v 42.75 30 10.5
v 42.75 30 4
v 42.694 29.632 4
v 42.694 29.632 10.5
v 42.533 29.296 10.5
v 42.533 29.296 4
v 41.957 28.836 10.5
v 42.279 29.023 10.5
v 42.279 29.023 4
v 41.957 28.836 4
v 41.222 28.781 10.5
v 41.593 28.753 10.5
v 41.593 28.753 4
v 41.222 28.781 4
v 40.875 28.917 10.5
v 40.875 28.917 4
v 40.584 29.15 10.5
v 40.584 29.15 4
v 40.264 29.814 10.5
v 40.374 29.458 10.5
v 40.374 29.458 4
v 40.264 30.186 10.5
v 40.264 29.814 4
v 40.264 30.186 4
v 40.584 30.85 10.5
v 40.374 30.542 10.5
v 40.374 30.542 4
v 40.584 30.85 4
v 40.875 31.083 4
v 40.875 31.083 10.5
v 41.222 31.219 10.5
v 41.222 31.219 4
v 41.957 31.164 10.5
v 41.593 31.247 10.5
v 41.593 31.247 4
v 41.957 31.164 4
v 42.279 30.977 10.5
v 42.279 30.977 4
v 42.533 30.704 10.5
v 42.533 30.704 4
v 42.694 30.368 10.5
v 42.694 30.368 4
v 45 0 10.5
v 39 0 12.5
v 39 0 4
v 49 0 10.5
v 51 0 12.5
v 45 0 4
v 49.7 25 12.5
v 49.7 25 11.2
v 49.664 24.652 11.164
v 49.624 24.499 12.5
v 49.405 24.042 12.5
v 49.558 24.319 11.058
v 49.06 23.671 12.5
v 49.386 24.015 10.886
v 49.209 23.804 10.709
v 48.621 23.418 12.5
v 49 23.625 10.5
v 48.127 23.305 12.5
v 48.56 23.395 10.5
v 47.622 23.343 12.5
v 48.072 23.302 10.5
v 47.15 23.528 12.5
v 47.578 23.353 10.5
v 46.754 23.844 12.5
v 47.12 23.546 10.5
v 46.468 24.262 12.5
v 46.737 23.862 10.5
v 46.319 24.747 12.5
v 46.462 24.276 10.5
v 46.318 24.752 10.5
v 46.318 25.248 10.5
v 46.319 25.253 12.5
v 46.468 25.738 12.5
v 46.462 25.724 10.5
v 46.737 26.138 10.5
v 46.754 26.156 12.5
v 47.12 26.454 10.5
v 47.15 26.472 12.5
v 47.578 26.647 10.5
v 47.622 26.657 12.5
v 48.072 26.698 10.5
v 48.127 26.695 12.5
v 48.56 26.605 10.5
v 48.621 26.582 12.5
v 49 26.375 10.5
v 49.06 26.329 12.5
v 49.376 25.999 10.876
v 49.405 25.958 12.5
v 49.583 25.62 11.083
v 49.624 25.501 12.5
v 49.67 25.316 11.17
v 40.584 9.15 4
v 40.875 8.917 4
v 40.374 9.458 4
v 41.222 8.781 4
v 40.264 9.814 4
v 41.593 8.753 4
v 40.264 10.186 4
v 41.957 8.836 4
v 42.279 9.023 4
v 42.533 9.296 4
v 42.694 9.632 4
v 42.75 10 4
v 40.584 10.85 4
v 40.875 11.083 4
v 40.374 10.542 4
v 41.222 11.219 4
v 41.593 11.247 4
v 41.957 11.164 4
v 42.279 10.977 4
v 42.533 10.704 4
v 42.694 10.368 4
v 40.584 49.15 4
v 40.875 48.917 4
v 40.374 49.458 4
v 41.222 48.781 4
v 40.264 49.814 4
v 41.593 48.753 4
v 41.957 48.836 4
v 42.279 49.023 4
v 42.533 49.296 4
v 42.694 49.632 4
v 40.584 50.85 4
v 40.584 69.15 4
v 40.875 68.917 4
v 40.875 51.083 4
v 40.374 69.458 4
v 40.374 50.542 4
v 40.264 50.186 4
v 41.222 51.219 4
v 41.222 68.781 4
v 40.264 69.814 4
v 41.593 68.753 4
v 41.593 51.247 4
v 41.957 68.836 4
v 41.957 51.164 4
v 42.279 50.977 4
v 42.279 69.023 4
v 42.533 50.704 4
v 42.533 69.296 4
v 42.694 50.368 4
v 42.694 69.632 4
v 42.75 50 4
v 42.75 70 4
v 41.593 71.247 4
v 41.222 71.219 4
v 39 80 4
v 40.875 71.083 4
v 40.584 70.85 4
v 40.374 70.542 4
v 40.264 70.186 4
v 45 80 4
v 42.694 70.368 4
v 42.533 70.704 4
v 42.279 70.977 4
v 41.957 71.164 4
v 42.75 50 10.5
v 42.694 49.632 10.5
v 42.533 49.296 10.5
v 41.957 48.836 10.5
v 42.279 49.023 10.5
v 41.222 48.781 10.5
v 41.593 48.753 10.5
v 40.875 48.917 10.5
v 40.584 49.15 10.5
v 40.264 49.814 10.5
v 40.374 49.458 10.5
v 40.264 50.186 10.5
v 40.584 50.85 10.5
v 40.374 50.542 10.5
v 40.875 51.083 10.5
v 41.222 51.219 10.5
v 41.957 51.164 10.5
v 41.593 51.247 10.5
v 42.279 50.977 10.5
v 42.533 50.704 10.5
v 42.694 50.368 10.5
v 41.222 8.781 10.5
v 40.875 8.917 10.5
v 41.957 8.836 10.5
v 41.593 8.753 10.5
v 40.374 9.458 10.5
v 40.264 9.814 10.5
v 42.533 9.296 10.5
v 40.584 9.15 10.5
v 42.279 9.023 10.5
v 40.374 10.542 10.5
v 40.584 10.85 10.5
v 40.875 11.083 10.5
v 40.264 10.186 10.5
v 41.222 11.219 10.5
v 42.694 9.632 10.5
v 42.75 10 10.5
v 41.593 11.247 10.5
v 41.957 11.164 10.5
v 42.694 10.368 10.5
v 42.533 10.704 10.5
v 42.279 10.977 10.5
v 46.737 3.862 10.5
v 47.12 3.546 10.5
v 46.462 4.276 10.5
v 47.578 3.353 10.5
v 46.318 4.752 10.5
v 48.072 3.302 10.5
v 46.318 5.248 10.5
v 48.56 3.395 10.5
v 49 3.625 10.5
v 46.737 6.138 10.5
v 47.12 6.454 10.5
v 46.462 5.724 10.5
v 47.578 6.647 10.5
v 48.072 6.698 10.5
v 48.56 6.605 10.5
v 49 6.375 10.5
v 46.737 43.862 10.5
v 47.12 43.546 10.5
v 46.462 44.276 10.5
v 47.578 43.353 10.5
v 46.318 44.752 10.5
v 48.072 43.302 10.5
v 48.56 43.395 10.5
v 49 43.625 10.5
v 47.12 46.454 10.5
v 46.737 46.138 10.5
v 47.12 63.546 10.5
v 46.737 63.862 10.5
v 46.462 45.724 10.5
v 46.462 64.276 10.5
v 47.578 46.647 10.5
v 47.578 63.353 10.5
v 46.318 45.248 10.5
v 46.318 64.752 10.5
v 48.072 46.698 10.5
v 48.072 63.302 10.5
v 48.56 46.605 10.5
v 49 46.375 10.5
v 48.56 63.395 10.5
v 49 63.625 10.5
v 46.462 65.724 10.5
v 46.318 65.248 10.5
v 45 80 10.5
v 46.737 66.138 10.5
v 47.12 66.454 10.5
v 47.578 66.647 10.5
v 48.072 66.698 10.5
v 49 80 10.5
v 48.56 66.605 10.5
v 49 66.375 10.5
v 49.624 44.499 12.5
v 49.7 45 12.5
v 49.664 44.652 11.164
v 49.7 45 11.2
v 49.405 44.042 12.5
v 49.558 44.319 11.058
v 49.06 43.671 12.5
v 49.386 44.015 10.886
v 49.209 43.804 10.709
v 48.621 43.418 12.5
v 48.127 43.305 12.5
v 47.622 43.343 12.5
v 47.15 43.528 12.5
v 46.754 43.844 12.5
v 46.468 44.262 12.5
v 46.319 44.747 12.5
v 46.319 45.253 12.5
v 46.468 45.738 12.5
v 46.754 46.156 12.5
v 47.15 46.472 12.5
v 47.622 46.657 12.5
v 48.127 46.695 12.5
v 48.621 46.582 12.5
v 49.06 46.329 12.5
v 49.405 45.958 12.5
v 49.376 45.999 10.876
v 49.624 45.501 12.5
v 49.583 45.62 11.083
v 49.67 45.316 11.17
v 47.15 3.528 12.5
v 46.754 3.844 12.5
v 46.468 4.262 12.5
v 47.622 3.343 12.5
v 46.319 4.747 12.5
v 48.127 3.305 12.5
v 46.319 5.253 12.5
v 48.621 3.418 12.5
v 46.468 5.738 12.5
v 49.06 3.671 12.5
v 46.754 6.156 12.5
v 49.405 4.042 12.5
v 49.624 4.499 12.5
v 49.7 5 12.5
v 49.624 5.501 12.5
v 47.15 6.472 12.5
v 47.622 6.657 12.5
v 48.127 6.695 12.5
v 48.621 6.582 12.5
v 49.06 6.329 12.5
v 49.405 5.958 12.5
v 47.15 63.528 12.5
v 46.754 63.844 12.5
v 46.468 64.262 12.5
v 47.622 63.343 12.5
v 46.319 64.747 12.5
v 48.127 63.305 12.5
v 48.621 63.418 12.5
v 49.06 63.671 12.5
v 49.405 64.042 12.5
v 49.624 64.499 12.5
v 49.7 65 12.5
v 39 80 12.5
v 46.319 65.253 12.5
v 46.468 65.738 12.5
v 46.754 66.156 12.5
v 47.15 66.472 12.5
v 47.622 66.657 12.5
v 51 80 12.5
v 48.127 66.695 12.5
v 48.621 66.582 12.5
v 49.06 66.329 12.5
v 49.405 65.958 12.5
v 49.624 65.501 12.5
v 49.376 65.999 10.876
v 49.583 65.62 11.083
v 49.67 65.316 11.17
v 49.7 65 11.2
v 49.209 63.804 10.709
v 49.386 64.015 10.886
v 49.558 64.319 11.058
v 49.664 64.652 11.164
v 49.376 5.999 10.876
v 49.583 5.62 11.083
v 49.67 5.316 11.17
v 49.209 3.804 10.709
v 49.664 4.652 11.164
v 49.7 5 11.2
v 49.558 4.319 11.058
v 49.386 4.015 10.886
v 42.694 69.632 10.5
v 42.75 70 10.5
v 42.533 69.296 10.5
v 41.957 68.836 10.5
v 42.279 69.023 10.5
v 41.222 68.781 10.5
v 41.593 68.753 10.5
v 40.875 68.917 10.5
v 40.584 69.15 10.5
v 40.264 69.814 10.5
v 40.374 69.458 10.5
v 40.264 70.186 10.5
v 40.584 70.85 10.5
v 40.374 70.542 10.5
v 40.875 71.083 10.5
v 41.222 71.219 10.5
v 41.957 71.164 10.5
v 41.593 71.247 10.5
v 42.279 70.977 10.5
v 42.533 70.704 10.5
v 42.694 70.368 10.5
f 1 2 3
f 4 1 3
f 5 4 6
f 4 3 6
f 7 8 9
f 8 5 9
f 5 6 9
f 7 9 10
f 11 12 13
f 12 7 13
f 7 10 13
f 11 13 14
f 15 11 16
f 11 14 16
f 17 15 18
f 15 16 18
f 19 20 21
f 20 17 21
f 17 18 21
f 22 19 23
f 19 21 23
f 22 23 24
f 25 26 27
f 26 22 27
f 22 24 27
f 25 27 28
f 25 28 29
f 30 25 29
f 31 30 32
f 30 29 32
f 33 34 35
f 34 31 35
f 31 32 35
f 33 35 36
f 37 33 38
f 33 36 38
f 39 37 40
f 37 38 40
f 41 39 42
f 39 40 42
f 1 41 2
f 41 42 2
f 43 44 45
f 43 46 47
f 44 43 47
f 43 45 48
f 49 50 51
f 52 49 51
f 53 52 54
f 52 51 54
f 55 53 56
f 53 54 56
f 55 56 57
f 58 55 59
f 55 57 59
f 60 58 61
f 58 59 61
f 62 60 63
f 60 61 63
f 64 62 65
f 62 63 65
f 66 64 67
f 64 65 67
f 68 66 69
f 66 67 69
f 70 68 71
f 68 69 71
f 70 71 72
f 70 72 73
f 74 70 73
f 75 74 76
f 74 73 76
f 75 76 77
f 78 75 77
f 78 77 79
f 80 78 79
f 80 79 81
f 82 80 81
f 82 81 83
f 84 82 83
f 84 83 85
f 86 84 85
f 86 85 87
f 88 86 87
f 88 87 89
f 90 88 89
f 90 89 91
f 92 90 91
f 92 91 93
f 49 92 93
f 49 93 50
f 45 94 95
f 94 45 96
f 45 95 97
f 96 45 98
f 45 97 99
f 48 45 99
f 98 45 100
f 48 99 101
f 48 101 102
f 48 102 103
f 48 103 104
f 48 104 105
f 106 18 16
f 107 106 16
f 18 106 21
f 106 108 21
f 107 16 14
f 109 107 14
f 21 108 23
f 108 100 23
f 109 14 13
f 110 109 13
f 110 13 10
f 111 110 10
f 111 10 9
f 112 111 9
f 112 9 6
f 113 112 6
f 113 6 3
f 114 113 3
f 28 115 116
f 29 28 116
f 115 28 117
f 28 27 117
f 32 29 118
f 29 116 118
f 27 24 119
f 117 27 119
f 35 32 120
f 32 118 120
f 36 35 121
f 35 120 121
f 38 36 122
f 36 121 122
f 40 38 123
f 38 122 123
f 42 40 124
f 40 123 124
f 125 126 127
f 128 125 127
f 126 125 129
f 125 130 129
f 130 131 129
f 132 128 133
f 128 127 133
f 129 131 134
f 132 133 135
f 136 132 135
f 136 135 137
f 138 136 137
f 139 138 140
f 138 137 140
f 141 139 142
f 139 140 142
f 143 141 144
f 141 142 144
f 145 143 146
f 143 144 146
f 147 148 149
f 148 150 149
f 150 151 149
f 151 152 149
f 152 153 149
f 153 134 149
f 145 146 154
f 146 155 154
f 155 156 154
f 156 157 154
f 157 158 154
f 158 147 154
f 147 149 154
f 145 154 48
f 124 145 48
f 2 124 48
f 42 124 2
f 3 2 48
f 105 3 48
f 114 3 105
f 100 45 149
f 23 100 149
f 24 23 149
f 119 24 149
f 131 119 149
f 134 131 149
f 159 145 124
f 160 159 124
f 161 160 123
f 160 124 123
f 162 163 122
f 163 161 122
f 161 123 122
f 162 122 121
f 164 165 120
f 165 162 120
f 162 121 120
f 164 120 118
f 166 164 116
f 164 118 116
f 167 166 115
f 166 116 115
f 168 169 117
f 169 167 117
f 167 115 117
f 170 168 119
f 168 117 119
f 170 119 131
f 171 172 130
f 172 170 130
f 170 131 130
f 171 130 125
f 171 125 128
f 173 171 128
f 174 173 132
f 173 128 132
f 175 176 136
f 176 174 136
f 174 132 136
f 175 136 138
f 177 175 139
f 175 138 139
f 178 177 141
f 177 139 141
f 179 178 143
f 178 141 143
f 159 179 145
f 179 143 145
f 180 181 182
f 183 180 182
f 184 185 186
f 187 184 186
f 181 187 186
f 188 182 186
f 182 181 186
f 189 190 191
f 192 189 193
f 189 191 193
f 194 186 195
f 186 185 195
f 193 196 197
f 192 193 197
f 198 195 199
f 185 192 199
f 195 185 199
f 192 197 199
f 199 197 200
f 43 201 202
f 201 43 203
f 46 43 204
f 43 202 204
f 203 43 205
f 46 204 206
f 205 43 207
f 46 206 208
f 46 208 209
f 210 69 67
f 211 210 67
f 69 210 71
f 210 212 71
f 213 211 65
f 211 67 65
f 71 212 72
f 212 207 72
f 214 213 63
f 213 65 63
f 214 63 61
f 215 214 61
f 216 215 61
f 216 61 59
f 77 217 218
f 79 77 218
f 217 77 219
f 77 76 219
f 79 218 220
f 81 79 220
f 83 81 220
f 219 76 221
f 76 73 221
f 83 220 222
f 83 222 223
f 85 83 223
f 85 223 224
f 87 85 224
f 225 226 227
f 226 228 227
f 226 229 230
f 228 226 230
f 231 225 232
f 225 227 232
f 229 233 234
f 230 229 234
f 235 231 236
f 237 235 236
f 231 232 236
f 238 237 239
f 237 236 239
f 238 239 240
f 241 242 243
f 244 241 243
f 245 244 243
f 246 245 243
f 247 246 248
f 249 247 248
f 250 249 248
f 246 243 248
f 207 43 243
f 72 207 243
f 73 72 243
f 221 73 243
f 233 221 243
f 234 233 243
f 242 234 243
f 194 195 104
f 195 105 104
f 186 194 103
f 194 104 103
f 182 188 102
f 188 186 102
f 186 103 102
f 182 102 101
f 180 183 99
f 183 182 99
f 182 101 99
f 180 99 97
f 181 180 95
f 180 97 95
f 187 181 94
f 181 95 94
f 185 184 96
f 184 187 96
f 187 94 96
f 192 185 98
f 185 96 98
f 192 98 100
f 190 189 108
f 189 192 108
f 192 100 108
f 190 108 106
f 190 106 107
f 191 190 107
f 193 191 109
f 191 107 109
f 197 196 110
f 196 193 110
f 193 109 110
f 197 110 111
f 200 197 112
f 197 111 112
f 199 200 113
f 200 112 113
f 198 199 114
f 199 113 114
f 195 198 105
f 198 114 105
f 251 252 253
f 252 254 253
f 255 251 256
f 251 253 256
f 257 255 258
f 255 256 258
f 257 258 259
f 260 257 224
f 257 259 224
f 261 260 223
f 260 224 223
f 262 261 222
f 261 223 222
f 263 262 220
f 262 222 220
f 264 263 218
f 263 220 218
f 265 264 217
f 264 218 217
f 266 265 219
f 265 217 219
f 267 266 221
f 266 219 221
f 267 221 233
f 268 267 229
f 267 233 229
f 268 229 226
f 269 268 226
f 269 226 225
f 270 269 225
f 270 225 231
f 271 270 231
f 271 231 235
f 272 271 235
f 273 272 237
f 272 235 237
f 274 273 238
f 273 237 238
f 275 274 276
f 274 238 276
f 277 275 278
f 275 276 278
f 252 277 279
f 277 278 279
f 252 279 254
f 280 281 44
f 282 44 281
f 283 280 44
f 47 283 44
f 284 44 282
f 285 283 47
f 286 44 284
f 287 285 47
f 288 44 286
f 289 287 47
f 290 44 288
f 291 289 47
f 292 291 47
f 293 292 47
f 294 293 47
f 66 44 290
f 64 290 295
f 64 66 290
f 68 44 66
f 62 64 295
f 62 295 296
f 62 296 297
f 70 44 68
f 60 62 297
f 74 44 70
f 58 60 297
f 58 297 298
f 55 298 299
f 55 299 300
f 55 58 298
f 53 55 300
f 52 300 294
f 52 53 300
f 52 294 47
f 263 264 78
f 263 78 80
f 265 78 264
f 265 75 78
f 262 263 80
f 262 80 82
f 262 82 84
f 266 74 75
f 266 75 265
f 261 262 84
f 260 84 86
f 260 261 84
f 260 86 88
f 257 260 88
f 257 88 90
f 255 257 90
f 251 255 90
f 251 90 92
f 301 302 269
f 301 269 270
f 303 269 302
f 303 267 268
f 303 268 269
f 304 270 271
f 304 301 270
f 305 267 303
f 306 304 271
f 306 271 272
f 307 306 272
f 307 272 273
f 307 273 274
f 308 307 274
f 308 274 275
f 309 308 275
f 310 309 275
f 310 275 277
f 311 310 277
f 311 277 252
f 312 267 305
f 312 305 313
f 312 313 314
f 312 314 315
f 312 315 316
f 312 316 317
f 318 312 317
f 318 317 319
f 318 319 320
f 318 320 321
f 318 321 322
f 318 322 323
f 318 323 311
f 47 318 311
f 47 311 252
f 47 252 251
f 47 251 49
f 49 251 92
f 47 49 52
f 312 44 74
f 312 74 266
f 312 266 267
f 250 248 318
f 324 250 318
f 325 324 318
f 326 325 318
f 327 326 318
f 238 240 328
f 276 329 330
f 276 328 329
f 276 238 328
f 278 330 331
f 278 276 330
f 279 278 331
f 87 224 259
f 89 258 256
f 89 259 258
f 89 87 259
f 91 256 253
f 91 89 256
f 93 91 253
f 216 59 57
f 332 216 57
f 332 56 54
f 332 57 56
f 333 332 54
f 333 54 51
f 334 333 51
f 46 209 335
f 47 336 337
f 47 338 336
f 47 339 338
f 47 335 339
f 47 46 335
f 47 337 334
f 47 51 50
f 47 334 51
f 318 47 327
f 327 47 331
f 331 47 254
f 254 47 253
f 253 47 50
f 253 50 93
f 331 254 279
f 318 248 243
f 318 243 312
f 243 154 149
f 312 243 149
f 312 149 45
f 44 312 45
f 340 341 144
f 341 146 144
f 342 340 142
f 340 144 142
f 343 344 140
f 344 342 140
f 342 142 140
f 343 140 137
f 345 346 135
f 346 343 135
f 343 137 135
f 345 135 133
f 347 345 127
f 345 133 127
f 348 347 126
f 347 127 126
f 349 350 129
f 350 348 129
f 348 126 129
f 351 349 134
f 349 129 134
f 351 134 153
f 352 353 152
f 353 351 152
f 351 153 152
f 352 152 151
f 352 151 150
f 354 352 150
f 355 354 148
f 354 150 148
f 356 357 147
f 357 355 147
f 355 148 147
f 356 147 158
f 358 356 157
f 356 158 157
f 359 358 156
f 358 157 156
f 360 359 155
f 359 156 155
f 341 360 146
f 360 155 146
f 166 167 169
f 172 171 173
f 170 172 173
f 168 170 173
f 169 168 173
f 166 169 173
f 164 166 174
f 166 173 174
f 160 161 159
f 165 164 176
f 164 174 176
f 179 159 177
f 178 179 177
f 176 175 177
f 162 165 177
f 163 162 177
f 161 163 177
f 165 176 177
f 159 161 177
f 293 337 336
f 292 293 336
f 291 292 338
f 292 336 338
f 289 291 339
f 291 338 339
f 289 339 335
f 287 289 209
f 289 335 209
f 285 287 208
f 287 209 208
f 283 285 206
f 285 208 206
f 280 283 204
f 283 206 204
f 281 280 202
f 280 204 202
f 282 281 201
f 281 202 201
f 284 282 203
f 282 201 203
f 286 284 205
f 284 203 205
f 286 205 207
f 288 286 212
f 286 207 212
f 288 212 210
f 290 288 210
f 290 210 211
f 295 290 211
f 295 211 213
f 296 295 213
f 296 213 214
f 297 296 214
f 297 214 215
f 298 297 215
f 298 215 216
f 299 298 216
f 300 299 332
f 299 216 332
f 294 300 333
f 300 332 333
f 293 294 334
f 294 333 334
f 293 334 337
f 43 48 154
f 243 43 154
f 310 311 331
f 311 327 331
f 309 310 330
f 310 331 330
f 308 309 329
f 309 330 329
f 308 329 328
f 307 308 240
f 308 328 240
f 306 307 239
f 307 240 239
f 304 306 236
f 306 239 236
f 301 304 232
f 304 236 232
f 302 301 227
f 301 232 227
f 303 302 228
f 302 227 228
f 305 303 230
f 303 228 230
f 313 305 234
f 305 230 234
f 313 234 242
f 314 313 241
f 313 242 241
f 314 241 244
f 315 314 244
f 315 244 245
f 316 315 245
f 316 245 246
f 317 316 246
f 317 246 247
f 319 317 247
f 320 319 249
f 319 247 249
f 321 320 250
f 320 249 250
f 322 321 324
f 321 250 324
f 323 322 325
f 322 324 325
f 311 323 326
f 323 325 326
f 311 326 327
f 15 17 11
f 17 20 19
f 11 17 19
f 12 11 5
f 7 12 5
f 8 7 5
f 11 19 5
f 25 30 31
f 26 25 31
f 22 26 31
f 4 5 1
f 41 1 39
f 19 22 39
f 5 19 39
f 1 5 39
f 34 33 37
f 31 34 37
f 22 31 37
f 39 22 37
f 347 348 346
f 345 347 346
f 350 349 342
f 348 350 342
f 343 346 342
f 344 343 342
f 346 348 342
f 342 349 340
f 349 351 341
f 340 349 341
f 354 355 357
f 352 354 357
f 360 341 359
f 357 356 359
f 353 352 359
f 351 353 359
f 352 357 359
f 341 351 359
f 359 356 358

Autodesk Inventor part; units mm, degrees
ref_plane "Right_Connecting_Web_StartPlane" through (0, 0, 4) normal (0, 0, 1) x (1, 0, 0)
sketch "Right_Connecting_Web_Profile" plane through (0, 0, 4) normal (0, 0, 1) x (1, 0, 0)
  line L0 (39, 0) -> (45, 0)
  line L1 (45, 0) -> (45, 80)
  line L2 (45, 80) -> (39, 80)
  line L3 (39, 80) -> (39, 0)
  point P0 (0, 0)
  dimension "d1" = 39
  dimension "d2" = 6
  dimension "d3" = 80
extrude "Right_Connecting_Web" add sketch "Right_Connecting_Web_Profile" along normal blind 8.5
ref_plane "Right_Rod_Contact_Flange_StartPlane" through (0, 0, 10.5) normal (0, 0, 1) x (1, 0, 0)
sketch "Right_Rod_Contact_Flange_Profile" plane through (0, 0, 10.5) normal (0, 0, 1) x (1, 0, 0)
  line L0 (39, 0) -> (51, 0)
  line L1 (51, 0) -> (51, 80)
  line L2 (51, 80) -> (39, 80)
  line L3 (39, 80) -> (39, 0)
  point P0 (0, 0)
  dimension "d7" = 39
  dimension "d8" = 12
  dimension "d9" = 80
extrude "Right_Rod_Contact_Flange" add sketch "Right_Rod_Contact_Flange_Profile" along normal blind 2
sketch "Original_Rod_Clearance_4x_Locations" plane through (0, 0, 0) normal (0, 0, 1) x (1, 0, 0)
  circle A0 centre (48, 5) radius 1.7
  circle A1 centre (48, 25) radius 1.7
  circle A2 centre (48, 45) radius 1.7
  circle A3 centre (48, 65) radius 1.7
  point P0 (0, 0)
  dimension "d12" = 48
  dimension "d13" = 5
  dimension "d14" = 3.4
  dimension "d15" = 48
  dimension "d16" = 25
  dimension "d17" = 3.4
  dimension "d18" = 48
  dimension "d19" = 45
  dimension "d20" = 3.4
  dimension "d21" = 48
  dimension "d22" = 65
  dimension "d23" = 3.4
extrude "Original_Rod_Clearance_4x" cut sketch "Original_Rod_Clearance_4x_Locations" along normal through all
ref_plane "Work Plane3" through (0, 0, 4) normal (0, 0, 1) x (1, 0, 0)
sketch "Deck_Assembly_M3_Locations" plane through (0, 0, 4) normal (0, 0, 1) x (1, 0, 0)
  circle A0 centre (41.5, 10) radius 1.25
  circle A1 centre (41.5, 30) radius 1.25
  circle A2 centre (41.5, 50) radius 1.25
  circle A3 centre (41.5, 70) radius 1.25
  point P0 (0, 0)
  dimension "d27" = 41.5
  dimension "d28" = 10
  dimension "d29" = 2.5
  dimension "d30" = 41.5
  dimension "d31" = 30
  dimension "d32" = 2.5
  dimension "d33" = 41.5
  dimension "d34" = 50
  dimension "d35" = 2.5
  dimension "d36" = 41.5
  dimension "d37" = 70
  dimension "d38" = 2.5
extrude "Four_Blind_M3_Tap_Bores" cut sketch "Deck_Assembly_M3_Locations" along normal blind 6.5
thread "Deck_M3x0_5_6H_1" size "M3x0.5" class "6H" standard "ISO Metric profile" length 6.5
thread "Deck_M3x0_5_6H_2" size "M3x0.5" class "6H" standard "ISO Metric profile" length 6.5
thread "Deck_M3x0_5_6H_3" size "M3x0.5" class "6H" standard "ISO Metric profile" length 6.5
thread "Deck_M3x0_5_6H_4" size "M3x0.5" class "6H" standard "ISO Metric profile" length 6.5
chamfer "Outer_End_2mm_45deg" distance 2 angle 45 1 edges at (51, 40, 10.5)
equation "\"d1\" = -RodWidth + OverallWidth - WebThickness"
equation "\"d2\" = WebThickness"
equation "\"d3\" = ContactLength"
equation "\"d4\" = DropHeight"
equation "\"d7\" = -RodWidth + OverallWidth - WebThickness"
equation "\"d8\" = RodWidth + WebThickness"
equation "\"d9\" = ContactLength"
equation "\"d10\" = RodFlangeThickness"
equation "\"d12\" = OverallWidth - 0.5 * RodWidth"
equation "\"d13\" = RodHoleStart + 0 * RodScrewPitch"
equation "\"d14\" = RodClearanceDiameter"
equation "\"d15\" = OverallWidth - 0.5 * RodWidth"
equation "\"d16\" = RodHoleStart + RodScrewPitch"
equation "\"d17\" = RodClearanceDiameter"
equation "\"d18\" = OverallWidth - 0.5 * RodWidth"
equation "\"d19\" = RodHoleStart + 2 * RodScrewPitch"
equation "\"d20\" = RodClearanceDiameter"
equation "\"d21\" = OverallWidth - 0.5 * RodWidth"
equation "\"d22\" = RodHoleStart + 3 * RodScrewPitch"
equation "\"d23\" = RodClearanceDiameter"
equation "\"d27\" = OverallWidth - JoinLeftX"
equation "\"d28\" = JoinFirstY + 0 * JoinPitch"
equation "\"d29\" = TapDrillDiameter"
equation "\"d30\" = OverallWidth - JoinLeftX"
equation "\"d31\" = JoinFirstY + JoinPitch"
equation "\"d32\" = TapDrillDiameter"
equation "\"d33\" = OverallWidth - JoinLeftX"
equation "\"d34\" = JoinFirstY + 2 * JoinPitch"
equation "\"d35\" = TapDrillDiameter"
equation "\"d36\" = OverallWidth - JoinLeftX"
equation "\"d37\" = JoinFirstY + 3 * JoinPitch"
equation "\"d38\" = TapDrillDiameter"
equation "\"d39\" = JoinThreadDepth"
equation "\"d41\" = JoinThreadDepth"
equation "\"d43\" = JoinThreadDepth"
equation "\"d45\" = JoinThreadDepth"
equation "\"d47\" = JoinThreadDepth"
equation "\"d49\" = OuterEndChamfer"
equation "\"d50\" = OuterEndChamfer"
equation "\"OverallWidth\" = 51"
equation "\"RodWidth\" = 6"
equation "\"ContactLength\" = 80"
equation "\"BaseThickness\" = 4"
equation "\"DropHeight\" = 8.5"
equation "\"WebThickness\" = 6"
equation "\"FingerStartX\" = 19.93338"
equation "\"FingerWidth\" = 13.5"
equation "\"FingerThickness\" = 6"
equation "\"FingerEndInset\" = 4"
equation "\"RodClearanceDiameter\" = 3.4"
equation "\"ClampFirstY\" = 41.82802"
equation "\"ClampPitch\" = 16"
equation "\"ClampHeight\" = BaseThickness + 0.5 * FingerThickness"
equation "\"TapDrillDiameter\" = 2.5"
equation "\"TapDepth\" = 6"
equation "\"RodHoleStart\" = 5"
equation "\"RodScrewPitch\" = 20"
equation "\"JoinLeftX\" = 9.5"
equation "\"JoinFirstY\" = 10"
equation "\"JoinPitch\" = 20"
equation "\"JoinThreadDepth\" = 6.5"
equation "\"JoinCountersinkDiameter\" = 6.2"
equation "\"d0\" = BaseThickness"
equation "\"d6\" = BaseThickness + DropHeight - RodFlangeThickness"
equation "\"d26\" = BaseThickness"
equation "\"RodFlangeThickness\" = 2"
equation "\"OuterEndChamfer\" = RodFlangeThickness"
properties part number "Right_Rod_Support"
